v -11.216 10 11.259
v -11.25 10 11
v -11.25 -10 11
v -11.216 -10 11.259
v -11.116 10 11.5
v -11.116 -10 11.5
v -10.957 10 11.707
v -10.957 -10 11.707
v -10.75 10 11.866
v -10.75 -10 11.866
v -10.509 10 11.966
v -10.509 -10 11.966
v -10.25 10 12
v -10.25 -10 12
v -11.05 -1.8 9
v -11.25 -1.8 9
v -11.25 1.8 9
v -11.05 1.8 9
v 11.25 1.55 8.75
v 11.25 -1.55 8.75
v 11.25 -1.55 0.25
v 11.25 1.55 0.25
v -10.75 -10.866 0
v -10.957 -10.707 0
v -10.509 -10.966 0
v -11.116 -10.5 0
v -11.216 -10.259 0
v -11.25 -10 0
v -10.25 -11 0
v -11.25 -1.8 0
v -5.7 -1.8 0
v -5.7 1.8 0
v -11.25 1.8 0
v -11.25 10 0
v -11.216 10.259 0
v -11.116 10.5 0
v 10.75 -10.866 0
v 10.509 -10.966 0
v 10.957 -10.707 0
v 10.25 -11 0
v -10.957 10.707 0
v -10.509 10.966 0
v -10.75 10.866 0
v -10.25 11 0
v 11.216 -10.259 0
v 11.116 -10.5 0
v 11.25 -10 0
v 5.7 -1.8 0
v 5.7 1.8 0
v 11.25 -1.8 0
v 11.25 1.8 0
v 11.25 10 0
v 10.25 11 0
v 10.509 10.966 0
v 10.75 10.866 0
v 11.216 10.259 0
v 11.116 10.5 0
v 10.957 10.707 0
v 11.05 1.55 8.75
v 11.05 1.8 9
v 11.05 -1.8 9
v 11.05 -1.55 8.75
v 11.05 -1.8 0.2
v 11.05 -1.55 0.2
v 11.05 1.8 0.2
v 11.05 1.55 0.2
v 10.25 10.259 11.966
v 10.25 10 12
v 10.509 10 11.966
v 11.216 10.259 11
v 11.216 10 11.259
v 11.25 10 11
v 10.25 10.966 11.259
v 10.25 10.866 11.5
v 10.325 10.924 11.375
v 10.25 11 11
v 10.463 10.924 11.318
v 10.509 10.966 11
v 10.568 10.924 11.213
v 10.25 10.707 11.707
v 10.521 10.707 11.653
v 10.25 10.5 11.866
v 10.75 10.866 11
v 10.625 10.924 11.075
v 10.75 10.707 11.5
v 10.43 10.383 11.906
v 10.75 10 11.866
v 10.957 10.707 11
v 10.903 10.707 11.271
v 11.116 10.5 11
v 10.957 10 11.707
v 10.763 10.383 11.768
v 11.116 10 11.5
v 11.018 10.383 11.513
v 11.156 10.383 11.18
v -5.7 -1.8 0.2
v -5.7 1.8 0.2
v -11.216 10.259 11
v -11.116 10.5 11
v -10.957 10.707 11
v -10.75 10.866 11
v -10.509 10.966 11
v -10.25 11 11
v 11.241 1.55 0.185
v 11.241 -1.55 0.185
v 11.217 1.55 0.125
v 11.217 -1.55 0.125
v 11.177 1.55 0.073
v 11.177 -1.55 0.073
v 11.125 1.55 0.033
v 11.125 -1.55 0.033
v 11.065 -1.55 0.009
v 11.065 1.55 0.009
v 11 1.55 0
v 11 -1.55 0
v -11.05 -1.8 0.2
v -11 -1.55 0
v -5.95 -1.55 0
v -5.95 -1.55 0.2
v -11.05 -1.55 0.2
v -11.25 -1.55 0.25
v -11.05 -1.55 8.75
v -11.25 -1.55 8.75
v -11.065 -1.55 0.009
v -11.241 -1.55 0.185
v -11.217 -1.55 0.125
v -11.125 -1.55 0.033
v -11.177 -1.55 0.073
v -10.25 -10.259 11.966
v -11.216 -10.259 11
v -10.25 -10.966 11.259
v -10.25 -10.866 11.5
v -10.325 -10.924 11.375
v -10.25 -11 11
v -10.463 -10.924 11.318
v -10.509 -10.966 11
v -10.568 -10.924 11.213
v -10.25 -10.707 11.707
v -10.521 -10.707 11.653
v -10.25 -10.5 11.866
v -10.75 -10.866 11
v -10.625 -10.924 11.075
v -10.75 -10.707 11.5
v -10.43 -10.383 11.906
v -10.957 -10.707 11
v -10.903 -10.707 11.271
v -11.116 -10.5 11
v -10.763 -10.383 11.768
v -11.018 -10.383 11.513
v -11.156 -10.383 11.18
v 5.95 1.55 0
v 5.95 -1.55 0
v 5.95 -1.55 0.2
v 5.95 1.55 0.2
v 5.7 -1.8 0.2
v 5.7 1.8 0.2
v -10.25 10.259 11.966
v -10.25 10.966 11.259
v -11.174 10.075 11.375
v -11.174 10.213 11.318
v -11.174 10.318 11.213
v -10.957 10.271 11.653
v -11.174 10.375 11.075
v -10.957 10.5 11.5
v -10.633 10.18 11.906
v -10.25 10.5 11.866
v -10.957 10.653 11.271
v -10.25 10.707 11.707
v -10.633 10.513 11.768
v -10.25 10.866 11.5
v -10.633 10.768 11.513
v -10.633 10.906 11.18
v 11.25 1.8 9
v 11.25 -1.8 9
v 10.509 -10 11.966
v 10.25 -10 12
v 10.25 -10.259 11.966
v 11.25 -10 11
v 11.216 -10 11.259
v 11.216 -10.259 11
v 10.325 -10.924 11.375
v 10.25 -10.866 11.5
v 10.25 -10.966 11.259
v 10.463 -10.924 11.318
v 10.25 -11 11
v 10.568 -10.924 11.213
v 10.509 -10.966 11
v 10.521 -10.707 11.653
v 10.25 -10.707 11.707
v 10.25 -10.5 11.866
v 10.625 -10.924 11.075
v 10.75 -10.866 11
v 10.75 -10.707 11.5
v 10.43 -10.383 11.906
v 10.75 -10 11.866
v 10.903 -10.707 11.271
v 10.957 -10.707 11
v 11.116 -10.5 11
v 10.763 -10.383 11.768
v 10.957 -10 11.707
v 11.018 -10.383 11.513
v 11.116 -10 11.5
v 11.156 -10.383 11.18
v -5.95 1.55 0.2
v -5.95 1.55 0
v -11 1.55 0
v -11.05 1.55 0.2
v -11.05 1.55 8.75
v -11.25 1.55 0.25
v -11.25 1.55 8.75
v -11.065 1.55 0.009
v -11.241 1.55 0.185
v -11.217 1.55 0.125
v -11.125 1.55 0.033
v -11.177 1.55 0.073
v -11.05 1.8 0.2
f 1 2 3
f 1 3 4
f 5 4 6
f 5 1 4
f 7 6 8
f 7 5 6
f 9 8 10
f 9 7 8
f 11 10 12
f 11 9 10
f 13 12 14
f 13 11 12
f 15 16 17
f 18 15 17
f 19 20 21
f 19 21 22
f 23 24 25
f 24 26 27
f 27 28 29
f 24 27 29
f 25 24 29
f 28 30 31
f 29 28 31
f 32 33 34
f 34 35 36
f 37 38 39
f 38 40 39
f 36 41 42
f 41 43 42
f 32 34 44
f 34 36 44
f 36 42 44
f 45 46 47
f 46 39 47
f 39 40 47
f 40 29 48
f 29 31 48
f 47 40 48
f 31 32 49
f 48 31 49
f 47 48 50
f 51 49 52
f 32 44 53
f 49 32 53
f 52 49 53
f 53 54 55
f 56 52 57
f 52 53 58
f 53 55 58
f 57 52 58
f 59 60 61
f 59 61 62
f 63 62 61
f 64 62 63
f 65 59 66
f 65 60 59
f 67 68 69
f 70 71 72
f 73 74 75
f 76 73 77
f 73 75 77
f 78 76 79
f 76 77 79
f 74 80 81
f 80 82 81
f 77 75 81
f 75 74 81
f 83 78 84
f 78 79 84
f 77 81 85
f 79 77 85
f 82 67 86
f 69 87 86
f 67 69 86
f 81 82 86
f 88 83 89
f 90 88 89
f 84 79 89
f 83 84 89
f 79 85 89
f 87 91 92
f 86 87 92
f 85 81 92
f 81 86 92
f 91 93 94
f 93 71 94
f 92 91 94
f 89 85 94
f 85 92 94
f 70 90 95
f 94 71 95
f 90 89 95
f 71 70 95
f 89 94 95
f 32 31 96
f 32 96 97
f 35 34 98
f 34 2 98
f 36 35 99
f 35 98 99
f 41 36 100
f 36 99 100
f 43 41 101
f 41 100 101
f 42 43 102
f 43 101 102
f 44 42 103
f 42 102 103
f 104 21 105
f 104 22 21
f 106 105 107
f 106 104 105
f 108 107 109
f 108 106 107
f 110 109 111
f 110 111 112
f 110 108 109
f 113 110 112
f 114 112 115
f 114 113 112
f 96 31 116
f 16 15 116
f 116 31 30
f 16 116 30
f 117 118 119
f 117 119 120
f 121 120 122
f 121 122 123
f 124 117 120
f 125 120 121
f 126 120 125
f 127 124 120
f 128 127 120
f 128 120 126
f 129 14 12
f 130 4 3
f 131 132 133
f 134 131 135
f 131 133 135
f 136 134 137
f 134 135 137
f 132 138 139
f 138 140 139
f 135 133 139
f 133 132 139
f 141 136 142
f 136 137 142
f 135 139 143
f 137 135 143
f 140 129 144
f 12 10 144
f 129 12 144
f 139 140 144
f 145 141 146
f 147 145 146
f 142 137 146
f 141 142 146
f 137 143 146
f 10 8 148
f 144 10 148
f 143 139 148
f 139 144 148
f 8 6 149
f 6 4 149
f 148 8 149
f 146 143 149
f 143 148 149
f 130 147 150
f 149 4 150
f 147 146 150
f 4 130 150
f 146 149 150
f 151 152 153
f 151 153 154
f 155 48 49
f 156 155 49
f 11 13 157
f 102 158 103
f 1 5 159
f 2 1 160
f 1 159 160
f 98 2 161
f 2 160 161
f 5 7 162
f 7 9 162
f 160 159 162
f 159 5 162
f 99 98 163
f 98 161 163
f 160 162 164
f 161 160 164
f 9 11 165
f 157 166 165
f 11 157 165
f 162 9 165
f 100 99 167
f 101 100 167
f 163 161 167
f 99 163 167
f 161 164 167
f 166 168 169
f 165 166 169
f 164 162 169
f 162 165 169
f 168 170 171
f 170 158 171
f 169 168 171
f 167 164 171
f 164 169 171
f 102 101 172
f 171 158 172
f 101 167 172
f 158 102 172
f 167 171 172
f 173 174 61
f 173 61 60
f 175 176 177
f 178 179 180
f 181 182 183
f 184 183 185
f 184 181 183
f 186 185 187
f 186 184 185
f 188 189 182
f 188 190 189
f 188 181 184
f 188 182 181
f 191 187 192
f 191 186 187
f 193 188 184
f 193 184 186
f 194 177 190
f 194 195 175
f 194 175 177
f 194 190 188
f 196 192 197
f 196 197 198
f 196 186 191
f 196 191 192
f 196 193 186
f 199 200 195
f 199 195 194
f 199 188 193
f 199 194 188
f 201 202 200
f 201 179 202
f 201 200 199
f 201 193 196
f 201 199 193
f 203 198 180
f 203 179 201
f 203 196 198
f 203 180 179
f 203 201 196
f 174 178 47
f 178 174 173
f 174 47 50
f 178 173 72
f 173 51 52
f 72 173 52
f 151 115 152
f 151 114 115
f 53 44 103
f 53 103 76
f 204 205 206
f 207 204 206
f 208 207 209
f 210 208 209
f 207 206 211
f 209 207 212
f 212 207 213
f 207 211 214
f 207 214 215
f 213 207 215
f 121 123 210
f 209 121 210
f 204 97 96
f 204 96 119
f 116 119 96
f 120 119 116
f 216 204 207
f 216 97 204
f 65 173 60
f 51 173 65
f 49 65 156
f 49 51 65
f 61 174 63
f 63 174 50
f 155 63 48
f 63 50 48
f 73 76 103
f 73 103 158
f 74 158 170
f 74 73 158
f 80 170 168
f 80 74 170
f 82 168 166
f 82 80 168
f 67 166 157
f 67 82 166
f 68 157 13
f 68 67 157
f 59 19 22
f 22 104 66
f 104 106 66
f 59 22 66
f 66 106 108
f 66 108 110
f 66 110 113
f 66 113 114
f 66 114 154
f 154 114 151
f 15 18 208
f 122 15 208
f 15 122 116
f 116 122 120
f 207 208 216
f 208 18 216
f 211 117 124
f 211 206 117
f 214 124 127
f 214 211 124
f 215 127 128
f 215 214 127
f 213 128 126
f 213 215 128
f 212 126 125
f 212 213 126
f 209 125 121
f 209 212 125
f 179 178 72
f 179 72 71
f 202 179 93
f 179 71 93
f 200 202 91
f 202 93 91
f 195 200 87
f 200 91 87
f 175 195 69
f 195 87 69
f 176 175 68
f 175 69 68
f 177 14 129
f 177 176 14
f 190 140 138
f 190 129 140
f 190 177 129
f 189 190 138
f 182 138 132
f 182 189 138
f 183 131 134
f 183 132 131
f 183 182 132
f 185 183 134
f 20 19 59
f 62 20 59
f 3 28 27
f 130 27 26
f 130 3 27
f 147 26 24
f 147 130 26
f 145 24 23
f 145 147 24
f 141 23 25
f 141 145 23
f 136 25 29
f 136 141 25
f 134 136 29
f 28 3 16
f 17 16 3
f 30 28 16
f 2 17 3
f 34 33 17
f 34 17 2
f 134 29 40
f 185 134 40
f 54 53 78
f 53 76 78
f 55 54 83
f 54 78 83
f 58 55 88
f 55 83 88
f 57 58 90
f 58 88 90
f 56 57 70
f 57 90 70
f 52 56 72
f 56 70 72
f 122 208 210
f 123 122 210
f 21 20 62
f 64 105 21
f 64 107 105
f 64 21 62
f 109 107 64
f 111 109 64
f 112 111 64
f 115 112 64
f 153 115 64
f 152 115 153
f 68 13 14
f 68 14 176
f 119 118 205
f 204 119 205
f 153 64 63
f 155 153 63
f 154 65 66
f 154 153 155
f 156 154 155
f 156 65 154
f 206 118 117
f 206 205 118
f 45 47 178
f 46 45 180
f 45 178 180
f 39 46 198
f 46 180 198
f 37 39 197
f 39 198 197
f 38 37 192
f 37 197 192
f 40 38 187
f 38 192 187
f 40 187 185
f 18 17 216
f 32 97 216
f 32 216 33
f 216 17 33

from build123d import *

# Parameters (mm, degrees)
SKETCH2_W           = 22.5
SKETCH2_H           = 22
BOSS_EXTRUDE1_DEPTH = 12
SKETCH3_W           = 5.55
SKETCH3_H           = 3.6
CUT_EXTRUDE1_DEPTH  = 0.2
SKETCH4_W           = 8.8
SKETCH4_H           = 3.6
CUT_EXTRUDE2_DEPTH  = 0.2
FILLET1_R           = 1
SKETCH5_W           = 5.3
SKETCH5_H           = 3.1
BOSS_EXTRUDE2_DEPTH = 8.75
FILLET2_R           = 0.25


with BuildPart() as part:
    # Sketch2 → Boss-Extrude1 (new body)
    with BuildSketch(Plane.XY):
        Rectangle(SKETCH2_W, SKETCH2_H)
    extrude(amount=BOSS_EXTRUDE1_DEPTH)

    # Sketch3 → Cut-Extrude1 (cut)
    with BuildSketch(Plane(origin=(0, 0, 0), x_dir=(-1, 0, 0), z_dir=(0, 0, -1))):
        with Locations((-8.475, 0)):
            Rectangle(SKETCH3_W, SKETCH3_H)
        with Locations((8.475, 0)):
            Rectangle(SKETCH3_W, SKETCH3_H)
    extrude(amount=-CUT_EXTRUDE1_DEPTH, mode=Mode.SUBTRACT)

    # Sketch4 → Cut-Extrude2 (cut)
    with BuildSketch(Plane(origin=(11.25, 0, 0), x_dir=(0, 0, -1), z_dir=(1, 0, 0))):
        with Locations((-4.6, 0)):
            Rectangle(SKETCH4_W, SKETCH4_H)
    cut_extrude2 = extrude(amount=-CUT_EXTRUDE2_DEPTH, mode=Mode.SUBTRACT)

    # Mirror1: Cut-Extrude2 across plane
    add(cut_extrude2.mirror(Plane(origin=(0, 0, 0), x_dir=(0, 0, 1), z_dir=(1, 0, 0))), mode=Mode.SUBTRACT)

    # Fillet1
    fillet1_edges = [part.edges().sort_by_distance(p)[0] for p in [
        (11.25, 0, 12),
        (0, 11, 12),
        (-11.25, 0, 12),
        (0, -11, 12),
        (-11.25, 11, 6),
        (11.25, 11, 6),
        (11.25, -11, 6),
        (-11.25, -11, 6),
    ]]
    fillet(fillet1_edges, radius=FILLET1_R)

    # Sketch5 → Boss-Extrude2 (add)
    with BuildSketch(Plane(origin=(0, 0, 0), x_dir=(-1, 0, 0), z_dir=(0, 0, -1))):
        with Locations((-8.6, 0)):
            Rectangle(SKETCH5_W, SKETCH5_H)
        with Locations((8.6, 0)):
            Rectangle(SKETCH5_W, SKETCH5_H)
    extrude(amount=-BOSS_EXTRUDE2_DEPTH)

    # Fillet2
    fillet2_edges = [part.edges().sort_by_distance(p)[0] for p in [
        (11.25, 0, 0),
        (-11.25, 0, 0),
    ]]
    fillet(fillet2_edges, radius=FILLET2_R)


solid = part.part
